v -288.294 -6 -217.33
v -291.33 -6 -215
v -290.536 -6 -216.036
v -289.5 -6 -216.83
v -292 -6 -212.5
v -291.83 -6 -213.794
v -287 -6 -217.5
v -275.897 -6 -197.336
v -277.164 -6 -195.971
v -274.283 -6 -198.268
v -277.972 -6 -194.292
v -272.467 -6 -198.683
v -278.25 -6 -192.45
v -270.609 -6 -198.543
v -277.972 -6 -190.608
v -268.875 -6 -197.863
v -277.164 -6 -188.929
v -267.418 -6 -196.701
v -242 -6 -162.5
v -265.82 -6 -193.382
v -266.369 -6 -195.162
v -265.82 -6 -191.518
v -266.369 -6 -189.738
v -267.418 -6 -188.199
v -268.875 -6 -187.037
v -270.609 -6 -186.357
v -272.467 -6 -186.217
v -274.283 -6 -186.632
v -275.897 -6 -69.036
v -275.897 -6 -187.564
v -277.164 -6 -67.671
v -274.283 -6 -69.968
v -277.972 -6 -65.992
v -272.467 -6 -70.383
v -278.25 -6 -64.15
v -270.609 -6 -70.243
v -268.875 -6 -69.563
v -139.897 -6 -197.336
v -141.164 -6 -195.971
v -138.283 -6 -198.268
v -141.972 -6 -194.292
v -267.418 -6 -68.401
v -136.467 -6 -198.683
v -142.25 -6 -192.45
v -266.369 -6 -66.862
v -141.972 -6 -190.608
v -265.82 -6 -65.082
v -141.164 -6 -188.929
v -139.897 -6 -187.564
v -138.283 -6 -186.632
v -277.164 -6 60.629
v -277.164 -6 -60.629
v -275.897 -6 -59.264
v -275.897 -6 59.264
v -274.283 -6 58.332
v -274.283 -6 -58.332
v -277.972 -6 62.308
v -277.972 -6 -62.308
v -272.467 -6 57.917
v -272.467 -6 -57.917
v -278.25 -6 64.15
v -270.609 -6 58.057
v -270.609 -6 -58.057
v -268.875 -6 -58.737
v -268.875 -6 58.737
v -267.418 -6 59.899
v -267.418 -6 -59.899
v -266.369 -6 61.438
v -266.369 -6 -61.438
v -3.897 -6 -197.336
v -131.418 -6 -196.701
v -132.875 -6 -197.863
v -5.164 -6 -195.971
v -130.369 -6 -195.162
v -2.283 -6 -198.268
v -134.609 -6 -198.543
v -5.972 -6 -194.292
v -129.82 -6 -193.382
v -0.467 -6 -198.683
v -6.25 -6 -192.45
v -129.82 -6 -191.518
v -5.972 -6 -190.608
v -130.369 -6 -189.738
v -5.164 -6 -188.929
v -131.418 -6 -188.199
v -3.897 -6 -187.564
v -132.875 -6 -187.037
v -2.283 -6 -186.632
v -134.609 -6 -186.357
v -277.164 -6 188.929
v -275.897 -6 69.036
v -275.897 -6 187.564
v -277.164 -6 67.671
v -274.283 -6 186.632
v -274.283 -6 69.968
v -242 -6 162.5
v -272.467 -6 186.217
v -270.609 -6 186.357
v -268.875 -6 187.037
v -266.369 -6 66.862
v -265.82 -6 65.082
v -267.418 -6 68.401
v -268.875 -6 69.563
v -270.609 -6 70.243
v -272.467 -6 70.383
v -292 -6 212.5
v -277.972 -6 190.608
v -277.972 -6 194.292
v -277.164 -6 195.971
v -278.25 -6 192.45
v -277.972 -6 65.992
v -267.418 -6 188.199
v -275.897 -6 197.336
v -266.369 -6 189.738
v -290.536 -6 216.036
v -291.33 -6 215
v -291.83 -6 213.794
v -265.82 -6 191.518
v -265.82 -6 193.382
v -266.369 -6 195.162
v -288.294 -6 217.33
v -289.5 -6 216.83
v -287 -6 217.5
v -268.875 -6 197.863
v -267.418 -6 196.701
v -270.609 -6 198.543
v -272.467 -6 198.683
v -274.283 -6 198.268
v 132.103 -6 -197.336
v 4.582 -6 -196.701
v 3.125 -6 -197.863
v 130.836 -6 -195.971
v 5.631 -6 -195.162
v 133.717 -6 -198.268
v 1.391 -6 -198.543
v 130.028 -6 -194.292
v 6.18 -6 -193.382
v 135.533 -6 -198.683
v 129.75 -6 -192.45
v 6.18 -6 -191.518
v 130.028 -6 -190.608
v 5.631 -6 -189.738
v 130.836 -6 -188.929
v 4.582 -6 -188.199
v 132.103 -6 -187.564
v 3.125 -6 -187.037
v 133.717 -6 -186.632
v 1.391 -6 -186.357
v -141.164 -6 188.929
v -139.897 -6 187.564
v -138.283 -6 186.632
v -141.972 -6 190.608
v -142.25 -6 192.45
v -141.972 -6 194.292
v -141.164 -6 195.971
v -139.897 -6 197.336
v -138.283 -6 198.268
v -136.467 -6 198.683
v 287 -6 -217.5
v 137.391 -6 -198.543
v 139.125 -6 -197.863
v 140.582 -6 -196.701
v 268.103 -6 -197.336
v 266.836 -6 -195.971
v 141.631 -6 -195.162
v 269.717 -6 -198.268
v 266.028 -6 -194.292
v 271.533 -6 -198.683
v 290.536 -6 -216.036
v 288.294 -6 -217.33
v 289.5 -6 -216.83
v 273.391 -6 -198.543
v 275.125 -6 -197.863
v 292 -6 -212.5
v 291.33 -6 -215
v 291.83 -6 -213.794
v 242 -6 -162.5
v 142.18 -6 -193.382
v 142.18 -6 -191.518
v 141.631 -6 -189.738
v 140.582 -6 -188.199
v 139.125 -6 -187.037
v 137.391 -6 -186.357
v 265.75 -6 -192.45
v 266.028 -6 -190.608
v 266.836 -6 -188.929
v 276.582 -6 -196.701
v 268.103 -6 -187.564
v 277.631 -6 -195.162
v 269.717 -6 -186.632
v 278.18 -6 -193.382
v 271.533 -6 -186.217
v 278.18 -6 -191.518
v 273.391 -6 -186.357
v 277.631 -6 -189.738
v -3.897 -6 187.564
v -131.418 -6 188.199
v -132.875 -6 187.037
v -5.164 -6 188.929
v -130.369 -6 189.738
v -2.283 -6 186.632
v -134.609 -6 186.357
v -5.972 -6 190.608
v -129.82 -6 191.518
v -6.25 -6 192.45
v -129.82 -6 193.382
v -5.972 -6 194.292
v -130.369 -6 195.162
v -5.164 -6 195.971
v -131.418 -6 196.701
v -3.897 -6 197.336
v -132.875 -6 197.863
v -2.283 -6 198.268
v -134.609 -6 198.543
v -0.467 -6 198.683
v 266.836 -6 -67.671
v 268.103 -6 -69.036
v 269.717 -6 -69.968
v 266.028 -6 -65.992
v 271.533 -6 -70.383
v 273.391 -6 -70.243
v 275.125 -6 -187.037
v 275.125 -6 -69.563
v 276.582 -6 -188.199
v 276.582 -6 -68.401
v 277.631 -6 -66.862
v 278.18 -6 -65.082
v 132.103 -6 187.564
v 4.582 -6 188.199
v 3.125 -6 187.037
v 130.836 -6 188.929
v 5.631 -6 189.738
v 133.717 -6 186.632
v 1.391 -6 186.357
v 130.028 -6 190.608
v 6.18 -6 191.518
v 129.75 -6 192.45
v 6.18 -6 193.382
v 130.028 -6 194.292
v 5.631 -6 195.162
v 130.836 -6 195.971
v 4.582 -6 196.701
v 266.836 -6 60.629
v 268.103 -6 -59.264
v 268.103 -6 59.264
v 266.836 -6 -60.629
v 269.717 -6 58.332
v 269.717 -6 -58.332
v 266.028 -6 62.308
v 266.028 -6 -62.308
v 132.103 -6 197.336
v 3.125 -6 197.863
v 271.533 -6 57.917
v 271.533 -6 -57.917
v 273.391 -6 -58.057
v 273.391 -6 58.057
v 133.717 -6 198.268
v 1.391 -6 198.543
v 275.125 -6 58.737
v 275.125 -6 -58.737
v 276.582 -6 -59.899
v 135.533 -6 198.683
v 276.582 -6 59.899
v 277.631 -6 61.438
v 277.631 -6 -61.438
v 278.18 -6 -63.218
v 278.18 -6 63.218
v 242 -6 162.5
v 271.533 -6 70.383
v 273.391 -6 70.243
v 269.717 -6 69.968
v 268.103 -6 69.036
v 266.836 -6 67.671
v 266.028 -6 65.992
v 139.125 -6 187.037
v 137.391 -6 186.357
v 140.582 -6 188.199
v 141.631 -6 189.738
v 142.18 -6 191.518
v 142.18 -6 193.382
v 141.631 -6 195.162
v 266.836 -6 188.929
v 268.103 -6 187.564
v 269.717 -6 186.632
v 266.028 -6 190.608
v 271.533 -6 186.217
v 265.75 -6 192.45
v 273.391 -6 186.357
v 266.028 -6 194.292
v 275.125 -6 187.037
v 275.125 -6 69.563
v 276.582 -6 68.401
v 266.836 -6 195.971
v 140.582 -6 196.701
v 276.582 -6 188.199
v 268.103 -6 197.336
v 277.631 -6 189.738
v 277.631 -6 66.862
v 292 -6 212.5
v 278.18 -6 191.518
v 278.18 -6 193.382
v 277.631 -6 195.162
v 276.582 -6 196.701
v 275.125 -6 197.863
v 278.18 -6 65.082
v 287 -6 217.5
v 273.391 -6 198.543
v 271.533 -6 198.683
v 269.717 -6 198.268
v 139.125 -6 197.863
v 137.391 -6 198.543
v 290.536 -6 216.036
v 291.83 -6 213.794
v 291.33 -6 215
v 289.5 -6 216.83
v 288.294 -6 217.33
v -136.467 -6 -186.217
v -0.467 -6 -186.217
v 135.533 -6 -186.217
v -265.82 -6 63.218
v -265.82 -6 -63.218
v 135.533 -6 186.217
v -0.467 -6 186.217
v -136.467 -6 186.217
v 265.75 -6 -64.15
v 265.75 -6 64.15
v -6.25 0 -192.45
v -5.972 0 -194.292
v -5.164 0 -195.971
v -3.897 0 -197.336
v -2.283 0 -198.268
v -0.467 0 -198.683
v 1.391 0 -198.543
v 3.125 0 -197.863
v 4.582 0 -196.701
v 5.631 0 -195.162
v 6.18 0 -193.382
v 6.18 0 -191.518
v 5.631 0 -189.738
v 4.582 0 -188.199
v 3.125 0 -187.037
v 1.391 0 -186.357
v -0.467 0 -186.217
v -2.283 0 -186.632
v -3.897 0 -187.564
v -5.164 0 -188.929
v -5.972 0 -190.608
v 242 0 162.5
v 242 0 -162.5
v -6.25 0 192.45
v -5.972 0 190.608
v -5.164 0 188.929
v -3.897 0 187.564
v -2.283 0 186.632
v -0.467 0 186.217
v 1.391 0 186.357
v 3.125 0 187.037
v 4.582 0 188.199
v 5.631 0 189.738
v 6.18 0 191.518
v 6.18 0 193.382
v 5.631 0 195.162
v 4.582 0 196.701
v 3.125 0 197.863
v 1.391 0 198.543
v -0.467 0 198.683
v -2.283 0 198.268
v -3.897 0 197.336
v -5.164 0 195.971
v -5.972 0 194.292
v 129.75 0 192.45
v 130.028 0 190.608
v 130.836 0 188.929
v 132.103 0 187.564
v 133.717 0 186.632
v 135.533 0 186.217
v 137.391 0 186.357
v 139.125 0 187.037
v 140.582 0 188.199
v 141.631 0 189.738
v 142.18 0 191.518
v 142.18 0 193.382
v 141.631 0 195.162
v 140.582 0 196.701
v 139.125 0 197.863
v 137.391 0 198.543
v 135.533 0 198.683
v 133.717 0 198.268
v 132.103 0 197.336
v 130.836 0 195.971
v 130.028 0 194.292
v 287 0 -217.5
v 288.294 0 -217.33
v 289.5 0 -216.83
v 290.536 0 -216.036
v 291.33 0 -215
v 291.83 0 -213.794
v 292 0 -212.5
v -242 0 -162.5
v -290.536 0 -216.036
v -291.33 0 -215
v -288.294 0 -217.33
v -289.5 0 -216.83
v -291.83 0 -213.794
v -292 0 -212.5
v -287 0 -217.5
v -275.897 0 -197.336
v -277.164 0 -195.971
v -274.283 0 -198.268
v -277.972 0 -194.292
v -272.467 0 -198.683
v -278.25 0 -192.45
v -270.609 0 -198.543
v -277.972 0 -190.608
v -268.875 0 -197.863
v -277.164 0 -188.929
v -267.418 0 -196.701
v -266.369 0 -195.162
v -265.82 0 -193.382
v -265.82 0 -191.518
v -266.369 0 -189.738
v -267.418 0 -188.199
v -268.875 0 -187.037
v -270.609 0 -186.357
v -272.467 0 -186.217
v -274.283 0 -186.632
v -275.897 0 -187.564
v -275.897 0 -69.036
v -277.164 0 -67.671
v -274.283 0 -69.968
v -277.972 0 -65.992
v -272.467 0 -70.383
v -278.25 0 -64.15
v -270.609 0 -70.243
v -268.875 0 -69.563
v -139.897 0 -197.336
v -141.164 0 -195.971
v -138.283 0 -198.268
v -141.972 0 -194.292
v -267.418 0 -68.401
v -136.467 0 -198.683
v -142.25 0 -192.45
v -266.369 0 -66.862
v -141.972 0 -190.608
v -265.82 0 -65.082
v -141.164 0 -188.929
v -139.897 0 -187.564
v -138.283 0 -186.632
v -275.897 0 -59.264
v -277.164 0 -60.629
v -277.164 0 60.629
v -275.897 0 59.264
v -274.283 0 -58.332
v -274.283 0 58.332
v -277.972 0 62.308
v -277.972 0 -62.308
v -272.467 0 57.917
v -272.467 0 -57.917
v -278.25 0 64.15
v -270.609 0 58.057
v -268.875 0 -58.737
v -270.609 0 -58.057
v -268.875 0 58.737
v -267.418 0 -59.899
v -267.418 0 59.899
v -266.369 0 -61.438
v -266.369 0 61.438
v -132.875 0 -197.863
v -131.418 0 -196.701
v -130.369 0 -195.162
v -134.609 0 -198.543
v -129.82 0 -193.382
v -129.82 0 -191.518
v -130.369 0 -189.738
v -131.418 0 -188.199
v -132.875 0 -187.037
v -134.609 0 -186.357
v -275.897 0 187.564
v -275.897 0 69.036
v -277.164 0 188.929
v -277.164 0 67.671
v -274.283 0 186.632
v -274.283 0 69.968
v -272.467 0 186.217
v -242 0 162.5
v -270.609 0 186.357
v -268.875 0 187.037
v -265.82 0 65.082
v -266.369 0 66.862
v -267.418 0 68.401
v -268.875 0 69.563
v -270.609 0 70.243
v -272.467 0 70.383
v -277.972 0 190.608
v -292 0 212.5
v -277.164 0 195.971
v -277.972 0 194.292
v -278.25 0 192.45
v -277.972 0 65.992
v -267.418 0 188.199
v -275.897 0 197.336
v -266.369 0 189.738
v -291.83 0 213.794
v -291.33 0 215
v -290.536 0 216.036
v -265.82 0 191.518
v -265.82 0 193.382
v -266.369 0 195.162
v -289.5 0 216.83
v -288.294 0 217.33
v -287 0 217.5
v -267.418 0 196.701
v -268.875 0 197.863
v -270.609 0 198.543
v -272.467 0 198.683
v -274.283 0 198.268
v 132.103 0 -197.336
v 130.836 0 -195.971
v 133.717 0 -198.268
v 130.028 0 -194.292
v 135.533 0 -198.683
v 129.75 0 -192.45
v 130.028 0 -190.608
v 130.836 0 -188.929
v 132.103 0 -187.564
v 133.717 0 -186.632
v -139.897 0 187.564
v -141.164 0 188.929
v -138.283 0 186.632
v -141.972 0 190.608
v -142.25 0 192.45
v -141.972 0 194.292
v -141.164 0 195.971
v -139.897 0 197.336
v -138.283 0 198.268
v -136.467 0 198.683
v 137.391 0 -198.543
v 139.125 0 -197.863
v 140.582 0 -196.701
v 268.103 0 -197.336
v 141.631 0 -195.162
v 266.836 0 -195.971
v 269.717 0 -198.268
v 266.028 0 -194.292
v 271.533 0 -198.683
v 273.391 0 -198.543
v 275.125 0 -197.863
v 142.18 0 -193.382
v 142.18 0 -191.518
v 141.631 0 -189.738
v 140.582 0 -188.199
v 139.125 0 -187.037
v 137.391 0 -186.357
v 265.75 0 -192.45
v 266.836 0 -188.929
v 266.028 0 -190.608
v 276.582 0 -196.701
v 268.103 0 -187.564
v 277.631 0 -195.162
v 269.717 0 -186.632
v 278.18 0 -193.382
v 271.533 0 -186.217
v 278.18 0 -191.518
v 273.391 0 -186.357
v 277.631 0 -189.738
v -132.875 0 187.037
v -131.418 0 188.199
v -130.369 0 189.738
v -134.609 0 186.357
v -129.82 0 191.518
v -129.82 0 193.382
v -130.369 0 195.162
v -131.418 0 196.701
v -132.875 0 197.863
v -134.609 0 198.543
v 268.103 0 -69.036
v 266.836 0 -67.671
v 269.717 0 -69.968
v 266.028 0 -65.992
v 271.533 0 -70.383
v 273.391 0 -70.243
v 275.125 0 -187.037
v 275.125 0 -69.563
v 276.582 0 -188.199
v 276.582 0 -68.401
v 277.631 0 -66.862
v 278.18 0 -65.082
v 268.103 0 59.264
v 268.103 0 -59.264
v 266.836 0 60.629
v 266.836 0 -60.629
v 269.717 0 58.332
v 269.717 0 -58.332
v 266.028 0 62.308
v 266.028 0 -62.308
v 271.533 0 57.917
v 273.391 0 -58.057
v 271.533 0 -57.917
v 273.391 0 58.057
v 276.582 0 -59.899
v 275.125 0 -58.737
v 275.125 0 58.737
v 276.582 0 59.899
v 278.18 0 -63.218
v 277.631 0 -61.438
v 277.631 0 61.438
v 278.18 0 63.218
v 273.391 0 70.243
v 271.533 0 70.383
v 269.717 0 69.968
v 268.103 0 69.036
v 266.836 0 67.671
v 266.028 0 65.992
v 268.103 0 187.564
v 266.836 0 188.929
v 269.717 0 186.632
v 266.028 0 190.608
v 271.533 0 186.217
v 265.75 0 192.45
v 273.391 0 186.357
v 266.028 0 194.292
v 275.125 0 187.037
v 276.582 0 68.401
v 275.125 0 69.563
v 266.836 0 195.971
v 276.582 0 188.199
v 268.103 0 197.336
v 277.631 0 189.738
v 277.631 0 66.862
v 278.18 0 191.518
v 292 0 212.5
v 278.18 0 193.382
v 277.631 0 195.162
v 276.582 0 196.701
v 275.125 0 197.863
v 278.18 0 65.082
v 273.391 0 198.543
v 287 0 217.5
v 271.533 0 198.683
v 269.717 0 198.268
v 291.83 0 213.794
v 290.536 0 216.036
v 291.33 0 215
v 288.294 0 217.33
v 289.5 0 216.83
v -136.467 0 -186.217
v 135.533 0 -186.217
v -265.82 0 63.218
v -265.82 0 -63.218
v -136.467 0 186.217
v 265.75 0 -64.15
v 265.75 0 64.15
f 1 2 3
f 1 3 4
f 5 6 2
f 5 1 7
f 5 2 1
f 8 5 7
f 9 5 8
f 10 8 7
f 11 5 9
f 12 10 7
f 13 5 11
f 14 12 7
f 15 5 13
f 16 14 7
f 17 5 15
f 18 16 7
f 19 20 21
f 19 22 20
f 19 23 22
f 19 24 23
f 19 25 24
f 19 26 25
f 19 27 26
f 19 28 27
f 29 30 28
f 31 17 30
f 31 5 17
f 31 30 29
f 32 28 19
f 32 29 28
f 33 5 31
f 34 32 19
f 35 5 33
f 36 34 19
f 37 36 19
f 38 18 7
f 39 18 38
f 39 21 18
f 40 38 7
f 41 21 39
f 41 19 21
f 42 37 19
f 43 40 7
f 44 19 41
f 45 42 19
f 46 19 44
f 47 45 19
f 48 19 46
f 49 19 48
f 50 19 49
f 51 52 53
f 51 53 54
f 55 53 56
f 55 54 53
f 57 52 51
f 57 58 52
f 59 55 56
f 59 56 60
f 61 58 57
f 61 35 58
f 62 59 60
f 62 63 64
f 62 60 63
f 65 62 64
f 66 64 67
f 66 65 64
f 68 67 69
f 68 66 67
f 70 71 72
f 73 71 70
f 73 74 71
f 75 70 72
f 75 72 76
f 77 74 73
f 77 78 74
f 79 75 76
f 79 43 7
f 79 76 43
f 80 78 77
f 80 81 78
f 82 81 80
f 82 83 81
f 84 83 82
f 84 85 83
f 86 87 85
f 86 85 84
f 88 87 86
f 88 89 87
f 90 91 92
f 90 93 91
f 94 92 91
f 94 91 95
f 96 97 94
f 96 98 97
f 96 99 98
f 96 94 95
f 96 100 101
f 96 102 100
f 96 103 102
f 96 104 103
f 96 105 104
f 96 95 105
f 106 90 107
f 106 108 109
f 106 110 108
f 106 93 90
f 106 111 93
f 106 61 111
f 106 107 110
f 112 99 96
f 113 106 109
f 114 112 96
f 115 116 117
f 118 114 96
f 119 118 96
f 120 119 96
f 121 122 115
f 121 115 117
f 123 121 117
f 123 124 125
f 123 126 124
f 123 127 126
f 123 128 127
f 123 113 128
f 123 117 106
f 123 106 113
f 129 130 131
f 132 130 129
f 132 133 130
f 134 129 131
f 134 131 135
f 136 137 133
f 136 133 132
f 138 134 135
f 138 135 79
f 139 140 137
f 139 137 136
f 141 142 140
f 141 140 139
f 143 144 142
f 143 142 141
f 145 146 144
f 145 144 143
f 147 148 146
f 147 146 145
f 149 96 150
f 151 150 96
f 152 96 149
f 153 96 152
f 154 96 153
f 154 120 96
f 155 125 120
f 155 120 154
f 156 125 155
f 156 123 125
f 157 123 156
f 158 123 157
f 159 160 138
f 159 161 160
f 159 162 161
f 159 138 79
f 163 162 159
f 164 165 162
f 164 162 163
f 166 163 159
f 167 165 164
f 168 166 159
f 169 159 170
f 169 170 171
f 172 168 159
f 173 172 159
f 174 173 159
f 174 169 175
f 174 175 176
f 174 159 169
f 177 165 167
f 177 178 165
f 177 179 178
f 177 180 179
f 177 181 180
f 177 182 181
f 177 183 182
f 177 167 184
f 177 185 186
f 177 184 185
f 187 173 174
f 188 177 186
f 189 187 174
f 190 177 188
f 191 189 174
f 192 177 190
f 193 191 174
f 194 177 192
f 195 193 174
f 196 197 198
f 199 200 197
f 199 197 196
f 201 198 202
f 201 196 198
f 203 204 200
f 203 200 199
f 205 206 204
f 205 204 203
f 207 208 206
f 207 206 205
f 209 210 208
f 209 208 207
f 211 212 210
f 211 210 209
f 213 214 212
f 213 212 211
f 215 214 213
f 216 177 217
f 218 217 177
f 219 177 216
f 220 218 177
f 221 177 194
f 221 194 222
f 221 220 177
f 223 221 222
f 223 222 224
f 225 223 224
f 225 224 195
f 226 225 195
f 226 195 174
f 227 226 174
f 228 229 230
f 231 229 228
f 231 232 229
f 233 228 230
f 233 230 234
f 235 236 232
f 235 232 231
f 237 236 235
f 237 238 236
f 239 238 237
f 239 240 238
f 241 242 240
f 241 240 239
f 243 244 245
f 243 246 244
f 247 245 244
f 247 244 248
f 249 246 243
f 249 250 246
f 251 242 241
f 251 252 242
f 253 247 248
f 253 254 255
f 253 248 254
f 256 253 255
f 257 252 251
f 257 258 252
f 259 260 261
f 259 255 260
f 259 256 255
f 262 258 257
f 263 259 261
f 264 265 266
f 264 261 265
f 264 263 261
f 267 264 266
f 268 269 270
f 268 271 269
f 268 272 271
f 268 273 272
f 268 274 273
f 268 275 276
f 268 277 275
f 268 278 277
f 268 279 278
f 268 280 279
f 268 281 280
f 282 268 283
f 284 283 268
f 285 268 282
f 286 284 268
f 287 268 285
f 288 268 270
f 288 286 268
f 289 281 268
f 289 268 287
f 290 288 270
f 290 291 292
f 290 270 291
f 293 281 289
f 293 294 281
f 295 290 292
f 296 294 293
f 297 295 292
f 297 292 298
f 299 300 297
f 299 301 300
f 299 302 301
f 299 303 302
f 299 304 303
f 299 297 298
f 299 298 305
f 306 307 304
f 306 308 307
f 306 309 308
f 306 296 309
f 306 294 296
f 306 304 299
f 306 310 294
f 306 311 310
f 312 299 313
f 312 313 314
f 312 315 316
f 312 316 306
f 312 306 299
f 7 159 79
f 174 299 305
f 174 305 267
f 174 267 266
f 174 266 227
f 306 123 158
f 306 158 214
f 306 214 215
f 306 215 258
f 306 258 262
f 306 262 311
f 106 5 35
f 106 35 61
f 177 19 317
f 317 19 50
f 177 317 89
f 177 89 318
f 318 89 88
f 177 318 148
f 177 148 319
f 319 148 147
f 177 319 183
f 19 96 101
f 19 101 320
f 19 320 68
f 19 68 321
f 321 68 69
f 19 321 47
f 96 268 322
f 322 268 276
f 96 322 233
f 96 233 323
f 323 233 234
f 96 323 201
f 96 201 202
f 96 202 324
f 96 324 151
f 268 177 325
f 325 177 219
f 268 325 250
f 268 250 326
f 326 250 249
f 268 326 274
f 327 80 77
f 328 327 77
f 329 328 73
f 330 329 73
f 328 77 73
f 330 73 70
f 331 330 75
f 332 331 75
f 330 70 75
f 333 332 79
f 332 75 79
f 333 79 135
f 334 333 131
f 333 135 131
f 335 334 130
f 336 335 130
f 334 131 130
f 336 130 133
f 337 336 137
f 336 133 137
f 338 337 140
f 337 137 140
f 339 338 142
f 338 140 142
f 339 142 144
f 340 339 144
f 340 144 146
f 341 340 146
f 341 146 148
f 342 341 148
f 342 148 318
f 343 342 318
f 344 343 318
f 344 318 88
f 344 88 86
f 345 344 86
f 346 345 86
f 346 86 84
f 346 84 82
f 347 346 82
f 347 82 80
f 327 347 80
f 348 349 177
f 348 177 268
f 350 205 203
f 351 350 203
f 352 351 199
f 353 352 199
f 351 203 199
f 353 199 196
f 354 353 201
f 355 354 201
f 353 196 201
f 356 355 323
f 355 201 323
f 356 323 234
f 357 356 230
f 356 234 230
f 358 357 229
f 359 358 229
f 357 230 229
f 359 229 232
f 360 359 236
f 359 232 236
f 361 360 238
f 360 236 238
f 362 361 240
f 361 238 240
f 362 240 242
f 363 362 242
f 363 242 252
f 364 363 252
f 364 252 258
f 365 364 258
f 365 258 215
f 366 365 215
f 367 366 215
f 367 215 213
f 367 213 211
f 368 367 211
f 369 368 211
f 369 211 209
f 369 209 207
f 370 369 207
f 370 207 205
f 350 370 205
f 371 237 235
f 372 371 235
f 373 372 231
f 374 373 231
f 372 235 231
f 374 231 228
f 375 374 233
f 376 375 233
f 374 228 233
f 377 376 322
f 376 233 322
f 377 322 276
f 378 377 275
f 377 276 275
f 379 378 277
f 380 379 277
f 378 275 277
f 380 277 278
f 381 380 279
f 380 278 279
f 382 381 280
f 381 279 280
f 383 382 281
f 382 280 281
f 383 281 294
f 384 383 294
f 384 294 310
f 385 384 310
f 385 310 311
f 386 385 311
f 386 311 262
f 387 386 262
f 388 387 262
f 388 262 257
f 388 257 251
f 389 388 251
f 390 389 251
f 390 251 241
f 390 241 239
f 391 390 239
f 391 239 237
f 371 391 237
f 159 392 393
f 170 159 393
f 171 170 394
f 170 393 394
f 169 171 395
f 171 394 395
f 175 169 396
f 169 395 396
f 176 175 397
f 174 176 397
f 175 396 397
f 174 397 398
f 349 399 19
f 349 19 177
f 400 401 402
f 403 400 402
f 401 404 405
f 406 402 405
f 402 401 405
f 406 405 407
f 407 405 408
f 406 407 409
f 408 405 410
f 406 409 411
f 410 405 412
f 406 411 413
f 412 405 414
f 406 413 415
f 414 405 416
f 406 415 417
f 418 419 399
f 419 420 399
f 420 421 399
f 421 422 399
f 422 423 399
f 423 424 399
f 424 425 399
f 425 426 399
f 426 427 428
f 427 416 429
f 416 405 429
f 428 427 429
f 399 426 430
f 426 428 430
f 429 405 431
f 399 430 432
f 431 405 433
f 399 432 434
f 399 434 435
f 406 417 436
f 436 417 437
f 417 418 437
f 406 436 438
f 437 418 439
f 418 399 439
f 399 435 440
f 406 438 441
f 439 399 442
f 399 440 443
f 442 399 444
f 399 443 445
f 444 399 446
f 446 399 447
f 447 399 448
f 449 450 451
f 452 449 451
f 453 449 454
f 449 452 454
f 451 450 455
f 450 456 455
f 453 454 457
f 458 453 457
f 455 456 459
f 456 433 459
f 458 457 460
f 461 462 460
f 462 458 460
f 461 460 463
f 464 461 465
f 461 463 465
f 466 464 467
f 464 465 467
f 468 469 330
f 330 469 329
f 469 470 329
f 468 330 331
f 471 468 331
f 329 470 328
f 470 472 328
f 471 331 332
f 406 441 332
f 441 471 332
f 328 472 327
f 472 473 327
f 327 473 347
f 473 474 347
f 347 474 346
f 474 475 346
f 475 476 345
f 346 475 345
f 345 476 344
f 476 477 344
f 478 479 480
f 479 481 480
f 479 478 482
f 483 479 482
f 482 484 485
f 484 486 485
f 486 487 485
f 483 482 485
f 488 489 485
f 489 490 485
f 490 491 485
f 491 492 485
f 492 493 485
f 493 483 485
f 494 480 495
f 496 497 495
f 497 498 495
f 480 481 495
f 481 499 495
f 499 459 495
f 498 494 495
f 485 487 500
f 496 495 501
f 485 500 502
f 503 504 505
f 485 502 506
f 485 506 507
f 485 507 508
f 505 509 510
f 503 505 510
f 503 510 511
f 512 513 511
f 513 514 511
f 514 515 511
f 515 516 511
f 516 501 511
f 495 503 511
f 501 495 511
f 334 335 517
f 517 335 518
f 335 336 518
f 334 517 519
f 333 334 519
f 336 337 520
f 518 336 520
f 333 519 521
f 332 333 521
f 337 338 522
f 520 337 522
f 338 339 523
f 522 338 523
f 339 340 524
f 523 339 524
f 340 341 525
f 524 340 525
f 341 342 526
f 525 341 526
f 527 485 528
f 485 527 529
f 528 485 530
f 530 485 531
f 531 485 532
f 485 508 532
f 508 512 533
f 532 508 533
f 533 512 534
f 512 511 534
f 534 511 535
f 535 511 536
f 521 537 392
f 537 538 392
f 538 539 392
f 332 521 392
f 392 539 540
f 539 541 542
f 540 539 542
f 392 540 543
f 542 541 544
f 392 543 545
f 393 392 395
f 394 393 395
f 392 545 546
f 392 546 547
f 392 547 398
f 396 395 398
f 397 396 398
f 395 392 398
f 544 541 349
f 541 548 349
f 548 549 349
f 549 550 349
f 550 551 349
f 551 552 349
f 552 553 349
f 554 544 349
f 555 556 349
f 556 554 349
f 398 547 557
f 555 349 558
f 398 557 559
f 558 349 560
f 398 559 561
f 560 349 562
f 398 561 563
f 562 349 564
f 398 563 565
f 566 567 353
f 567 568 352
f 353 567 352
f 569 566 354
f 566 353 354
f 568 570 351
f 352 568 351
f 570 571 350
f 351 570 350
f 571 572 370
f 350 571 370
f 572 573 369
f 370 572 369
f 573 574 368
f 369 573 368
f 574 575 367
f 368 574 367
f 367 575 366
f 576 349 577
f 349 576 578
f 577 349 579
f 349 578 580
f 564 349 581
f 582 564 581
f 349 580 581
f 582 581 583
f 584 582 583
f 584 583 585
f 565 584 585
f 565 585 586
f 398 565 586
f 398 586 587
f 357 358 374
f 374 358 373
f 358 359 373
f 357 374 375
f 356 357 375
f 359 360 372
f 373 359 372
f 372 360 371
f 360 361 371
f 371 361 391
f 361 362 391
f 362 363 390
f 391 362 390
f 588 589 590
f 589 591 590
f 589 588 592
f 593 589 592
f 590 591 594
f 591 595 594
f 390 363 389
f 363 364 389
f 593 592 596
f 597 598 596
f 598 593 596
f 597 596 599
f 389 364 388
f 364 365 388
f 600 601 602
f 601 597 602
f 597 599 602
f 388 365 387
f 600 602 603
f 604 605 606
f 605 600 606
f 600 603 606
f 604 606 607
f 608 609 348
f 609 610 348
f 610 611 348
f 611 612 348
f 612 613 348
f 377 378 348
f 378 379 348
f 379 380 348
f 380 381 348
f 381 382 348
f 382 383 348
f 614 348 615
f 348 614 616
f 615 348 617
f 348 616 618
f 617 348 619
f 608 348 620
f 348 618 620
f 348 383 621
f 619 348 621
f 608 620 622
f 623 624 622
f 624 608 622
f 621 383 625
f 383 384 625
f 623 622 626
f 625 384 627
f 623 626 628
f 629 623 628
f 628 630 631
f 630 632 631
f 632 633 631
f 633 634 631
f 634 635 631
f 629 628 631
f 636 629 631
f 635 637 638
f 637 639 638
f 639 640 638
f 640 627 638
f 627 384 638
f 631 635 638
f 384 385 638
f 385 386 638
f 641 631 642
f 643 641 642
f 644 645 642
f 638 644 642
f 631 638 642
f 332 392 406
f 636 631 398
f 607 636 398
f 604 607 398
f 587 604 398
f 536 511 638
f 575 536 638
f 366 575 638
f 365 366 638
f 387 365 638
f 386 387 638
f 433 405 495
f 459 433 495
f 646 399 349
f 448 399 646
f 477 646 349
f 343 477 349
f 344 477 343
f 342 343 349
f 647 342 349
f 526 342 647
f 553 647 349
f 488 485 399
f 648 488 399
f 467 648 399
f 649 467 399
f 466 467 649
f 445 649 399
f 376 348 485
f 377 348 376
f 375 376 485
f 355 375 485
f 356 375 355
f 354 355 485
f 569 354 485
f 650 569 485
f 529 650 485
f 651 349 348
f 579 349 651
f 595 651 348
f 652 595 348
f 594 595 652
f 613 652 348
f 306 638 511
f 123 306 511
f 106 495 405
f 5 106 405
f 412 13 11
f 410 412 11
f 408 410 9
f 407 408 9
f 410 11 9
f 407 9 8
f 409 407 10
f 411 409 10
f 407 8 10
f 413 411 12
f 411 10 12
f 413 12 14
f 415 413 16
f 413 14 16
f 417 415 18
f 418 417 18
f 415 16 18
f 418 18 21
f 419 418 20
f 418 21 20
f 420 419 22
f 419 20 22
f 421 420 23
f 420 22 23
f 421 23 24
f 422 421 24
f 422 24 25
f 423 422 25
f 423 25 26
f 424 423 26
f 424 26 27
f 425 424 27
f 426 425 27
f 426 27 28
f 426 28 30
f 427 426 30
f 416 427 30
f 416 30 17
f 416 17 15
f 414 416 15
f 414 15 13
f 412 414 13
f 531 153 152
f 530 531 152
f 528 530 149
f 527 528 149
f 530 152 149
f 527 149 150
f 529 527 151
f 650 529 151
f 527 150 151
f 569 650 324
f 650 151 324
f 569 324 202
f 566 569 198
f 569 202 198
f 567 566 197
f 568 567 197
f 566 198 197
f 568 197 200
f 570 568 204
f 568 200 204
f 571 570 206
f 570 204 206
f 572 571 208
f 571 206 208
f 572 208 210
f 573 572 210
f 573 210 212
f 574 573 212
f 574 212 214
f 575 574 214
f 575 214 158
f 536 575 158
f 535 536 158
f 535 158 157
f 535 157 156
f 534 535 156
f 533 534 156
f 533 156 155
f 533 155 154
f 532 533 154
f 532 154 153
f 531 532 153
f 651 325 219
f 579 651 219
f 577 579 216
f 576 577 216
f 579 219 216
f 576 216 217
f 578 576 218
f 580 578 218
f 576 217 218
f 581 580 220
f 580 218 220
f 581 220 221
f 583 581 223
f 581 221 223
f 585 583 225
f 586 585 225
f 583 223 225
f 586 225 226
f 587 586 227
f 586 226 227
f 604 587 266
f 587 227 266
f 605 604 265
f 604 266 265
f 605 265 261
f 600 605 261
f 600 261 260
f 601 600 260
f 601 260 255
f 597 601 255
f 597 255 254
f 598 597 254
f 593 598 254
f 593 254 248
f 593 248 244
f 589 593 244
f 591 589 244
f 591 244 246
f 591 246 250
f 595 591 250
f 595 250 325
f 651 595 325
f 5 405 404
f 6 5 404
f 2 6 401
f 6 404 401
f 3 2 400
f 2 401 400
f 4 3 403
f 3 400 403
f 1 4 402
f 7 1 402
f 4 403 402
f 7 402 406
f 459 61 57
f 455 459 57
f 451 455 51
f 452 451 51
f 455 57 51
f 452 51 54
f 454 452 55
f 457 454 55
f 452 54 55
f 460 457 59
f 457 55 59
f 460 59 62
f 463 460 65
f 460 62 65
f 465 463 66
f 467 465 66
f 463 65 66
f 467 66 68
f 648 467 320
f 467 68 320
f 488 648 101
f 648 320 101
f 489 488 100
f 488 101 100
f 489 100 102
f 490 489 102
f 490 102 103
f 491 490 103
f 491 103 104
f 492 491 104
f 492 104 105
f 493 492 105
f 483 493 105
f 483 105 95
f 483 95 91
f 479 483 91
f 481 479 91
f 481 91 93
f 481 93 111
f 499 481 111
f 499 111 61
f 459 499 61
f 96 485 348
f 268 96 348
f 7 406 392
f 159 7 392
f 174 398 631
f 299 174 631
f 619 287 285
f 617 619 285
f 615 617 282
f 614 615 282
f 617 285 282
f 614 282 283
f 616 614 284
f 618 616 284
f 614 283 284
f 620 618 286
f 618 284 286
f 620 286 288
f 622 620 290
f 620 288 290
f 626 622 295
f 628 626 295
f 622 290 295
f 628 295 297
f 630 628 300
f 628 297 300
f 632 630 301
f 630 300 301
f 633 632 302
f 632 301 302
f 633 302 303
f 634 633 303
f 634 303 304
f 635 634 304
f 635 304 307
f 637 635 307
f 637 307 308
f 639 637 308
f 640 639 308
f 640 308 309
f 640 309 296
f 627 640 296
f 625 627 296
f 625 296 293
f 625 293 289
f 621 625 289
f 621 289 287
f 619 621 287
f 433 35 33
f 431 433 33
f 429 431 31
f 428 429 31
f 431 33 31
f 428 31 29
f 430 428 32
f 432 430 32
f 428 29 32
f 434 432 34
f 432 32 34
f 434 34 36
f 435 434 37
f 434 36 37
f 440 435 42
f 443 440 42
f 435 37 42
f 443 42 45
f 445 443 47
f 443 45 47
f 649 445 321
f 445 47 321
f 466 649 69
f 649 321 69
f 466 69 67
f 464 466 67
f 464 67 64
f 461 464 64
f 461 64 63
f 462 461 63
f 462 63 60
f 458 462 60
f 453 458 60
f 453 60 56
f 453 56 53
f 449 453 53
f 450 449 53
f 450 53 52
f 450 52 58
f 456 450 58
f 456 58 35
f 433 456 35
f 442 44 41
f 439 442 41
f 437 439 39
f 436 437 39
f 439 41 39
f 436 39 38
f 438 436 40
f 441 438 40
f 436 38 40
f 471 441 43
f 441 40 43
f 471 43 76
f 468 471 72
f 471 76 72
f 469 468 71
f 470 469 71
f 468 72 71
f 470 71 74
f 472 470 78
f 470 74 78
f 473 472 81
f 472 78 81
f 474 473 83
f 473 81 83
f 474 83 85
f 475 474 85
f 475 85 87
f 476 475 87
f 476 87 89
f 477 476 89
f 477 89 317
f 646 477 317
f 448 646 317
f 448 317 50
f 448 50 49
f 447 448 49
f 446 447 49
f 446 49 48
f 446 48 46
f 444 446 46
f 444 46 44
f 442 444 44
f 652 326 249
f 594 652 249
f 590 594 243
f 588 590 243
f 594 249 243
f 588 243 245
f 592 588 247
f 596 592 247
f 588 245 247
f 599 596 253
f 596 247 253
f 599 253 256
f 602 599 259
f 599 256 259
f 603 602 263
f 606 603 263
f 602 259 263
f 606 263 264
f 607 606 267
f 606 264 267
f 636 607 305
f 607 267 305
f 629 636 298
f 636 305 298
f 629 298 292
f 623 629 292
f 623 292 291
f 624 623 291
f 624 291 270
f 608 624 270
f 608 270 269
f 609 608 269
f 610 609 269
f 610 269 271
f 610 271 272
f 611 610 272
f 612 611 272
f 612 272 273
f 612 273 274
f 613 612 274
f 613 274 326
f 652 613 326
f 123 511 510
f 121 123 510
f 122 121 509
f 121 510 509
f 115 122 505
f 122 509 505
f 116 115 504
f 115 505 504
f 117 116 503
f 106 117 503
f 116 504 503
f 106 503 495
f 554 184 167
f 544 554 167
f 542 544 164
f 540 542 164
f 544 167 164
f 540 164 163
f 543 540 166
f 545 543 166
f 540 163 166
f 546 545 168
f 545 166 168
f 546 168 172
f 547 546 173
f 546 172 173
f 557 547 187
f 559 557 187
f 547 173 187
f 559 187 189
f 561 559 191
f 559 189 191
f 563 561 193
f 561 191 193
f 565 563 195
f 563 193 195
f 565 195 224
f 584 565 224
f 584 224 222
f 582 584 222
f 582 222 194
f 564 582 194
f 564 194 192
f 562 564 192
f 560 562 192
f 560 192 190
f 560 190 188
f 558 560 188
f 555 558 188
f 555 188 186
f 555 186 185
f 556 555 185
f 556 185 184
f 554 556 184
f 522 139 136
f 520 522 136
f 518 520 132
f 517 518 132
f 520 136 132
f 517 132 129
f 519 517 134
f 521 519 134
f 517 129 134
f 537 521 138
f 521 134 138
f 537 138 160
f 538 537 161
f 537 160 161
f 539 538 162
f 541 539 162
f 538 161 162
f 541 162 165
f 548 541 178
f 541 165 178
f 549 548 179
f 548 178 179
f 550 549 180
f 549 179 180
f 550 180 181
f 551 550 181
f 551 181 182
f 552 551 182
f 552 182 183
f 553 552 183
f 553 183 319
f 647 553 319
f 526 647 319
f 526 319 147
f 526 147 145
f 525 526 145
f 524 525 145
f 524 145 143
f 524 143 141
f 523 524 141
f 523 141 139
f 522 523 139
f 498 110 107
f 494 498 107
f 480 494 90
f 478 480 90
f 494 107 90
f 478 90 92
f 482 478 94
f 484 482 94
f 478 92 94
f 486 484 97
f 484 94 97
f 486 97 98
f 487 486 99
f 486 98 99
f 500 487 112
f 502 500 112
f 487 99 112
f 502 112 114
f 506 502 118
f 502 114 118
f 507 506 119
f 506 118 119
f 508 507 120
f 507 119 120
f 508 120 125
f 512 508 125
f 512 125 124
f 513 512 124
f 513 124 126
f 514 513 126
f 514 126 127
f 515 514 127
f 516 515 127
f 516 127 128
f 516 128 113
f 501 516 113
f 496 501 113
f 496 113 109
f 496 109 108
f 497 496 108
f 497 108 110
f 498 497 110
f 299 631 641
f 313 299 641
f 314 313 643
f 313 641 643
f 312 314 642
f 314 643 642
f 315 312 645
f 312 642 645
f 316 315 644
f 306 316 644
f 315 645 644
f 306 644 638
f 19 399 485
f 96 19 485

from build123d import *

# Parameters (mm, degrees)
F0_W     = 484
F0_H     = 325
F1_DEPTH = 6
F3_D     = 12.5


with BuildPart() as f1:
    # F0 (on Front) → F1 (new body)
    with BuildSketch(Plane.XZ):
        with BuildLine():
            Line((-287, -217.5), (287, -217.5))
            ThreePointArc((287, -217.5), (290.5355339059, -216.0355339059), (292, -212.5))
            Line((292, -212.5), (292, 212.5))
            ThreePointArc((292, 212.5), (290.5355339059, 216.0355339059), (287, 217.5))
            Line((287, 217.5), (-287, 217.5))
            ThreePointArc((-287, 217.5), (-290.5355339059, 216.0355339059), (-292, 212.5))
            Line((-292, 212.5), (-292, -212.5))
            ThreePointArc((-292, -212.5), (-290.5355339059, -216.0355339059), (-287, -217.5))
        make_face()
        Rectangle(F0_W, F0_H, mode=Mode.SUBTRACT)
    extrude(amount=F1_DEPTH)

    # F3 (through all)
    with Locations(Plane(origin=(0, 0, 0), x_dir=(1, 0, 0), z_dir=(0, 1, 0))):
        with Locations((-272, -192.45), (-272, -64.15), (-272, 64.15), (-272, 192.45), (-136, 192.45), (0, 192.45), (272, 192.45), (136, 192.45), (272, -64.15), (272, 64.15), (272, -192.45), (-136, -192.45), (136, -192.45), (0, -192.45)):
            Hole(F3_D / 2)


solid = f1.part
